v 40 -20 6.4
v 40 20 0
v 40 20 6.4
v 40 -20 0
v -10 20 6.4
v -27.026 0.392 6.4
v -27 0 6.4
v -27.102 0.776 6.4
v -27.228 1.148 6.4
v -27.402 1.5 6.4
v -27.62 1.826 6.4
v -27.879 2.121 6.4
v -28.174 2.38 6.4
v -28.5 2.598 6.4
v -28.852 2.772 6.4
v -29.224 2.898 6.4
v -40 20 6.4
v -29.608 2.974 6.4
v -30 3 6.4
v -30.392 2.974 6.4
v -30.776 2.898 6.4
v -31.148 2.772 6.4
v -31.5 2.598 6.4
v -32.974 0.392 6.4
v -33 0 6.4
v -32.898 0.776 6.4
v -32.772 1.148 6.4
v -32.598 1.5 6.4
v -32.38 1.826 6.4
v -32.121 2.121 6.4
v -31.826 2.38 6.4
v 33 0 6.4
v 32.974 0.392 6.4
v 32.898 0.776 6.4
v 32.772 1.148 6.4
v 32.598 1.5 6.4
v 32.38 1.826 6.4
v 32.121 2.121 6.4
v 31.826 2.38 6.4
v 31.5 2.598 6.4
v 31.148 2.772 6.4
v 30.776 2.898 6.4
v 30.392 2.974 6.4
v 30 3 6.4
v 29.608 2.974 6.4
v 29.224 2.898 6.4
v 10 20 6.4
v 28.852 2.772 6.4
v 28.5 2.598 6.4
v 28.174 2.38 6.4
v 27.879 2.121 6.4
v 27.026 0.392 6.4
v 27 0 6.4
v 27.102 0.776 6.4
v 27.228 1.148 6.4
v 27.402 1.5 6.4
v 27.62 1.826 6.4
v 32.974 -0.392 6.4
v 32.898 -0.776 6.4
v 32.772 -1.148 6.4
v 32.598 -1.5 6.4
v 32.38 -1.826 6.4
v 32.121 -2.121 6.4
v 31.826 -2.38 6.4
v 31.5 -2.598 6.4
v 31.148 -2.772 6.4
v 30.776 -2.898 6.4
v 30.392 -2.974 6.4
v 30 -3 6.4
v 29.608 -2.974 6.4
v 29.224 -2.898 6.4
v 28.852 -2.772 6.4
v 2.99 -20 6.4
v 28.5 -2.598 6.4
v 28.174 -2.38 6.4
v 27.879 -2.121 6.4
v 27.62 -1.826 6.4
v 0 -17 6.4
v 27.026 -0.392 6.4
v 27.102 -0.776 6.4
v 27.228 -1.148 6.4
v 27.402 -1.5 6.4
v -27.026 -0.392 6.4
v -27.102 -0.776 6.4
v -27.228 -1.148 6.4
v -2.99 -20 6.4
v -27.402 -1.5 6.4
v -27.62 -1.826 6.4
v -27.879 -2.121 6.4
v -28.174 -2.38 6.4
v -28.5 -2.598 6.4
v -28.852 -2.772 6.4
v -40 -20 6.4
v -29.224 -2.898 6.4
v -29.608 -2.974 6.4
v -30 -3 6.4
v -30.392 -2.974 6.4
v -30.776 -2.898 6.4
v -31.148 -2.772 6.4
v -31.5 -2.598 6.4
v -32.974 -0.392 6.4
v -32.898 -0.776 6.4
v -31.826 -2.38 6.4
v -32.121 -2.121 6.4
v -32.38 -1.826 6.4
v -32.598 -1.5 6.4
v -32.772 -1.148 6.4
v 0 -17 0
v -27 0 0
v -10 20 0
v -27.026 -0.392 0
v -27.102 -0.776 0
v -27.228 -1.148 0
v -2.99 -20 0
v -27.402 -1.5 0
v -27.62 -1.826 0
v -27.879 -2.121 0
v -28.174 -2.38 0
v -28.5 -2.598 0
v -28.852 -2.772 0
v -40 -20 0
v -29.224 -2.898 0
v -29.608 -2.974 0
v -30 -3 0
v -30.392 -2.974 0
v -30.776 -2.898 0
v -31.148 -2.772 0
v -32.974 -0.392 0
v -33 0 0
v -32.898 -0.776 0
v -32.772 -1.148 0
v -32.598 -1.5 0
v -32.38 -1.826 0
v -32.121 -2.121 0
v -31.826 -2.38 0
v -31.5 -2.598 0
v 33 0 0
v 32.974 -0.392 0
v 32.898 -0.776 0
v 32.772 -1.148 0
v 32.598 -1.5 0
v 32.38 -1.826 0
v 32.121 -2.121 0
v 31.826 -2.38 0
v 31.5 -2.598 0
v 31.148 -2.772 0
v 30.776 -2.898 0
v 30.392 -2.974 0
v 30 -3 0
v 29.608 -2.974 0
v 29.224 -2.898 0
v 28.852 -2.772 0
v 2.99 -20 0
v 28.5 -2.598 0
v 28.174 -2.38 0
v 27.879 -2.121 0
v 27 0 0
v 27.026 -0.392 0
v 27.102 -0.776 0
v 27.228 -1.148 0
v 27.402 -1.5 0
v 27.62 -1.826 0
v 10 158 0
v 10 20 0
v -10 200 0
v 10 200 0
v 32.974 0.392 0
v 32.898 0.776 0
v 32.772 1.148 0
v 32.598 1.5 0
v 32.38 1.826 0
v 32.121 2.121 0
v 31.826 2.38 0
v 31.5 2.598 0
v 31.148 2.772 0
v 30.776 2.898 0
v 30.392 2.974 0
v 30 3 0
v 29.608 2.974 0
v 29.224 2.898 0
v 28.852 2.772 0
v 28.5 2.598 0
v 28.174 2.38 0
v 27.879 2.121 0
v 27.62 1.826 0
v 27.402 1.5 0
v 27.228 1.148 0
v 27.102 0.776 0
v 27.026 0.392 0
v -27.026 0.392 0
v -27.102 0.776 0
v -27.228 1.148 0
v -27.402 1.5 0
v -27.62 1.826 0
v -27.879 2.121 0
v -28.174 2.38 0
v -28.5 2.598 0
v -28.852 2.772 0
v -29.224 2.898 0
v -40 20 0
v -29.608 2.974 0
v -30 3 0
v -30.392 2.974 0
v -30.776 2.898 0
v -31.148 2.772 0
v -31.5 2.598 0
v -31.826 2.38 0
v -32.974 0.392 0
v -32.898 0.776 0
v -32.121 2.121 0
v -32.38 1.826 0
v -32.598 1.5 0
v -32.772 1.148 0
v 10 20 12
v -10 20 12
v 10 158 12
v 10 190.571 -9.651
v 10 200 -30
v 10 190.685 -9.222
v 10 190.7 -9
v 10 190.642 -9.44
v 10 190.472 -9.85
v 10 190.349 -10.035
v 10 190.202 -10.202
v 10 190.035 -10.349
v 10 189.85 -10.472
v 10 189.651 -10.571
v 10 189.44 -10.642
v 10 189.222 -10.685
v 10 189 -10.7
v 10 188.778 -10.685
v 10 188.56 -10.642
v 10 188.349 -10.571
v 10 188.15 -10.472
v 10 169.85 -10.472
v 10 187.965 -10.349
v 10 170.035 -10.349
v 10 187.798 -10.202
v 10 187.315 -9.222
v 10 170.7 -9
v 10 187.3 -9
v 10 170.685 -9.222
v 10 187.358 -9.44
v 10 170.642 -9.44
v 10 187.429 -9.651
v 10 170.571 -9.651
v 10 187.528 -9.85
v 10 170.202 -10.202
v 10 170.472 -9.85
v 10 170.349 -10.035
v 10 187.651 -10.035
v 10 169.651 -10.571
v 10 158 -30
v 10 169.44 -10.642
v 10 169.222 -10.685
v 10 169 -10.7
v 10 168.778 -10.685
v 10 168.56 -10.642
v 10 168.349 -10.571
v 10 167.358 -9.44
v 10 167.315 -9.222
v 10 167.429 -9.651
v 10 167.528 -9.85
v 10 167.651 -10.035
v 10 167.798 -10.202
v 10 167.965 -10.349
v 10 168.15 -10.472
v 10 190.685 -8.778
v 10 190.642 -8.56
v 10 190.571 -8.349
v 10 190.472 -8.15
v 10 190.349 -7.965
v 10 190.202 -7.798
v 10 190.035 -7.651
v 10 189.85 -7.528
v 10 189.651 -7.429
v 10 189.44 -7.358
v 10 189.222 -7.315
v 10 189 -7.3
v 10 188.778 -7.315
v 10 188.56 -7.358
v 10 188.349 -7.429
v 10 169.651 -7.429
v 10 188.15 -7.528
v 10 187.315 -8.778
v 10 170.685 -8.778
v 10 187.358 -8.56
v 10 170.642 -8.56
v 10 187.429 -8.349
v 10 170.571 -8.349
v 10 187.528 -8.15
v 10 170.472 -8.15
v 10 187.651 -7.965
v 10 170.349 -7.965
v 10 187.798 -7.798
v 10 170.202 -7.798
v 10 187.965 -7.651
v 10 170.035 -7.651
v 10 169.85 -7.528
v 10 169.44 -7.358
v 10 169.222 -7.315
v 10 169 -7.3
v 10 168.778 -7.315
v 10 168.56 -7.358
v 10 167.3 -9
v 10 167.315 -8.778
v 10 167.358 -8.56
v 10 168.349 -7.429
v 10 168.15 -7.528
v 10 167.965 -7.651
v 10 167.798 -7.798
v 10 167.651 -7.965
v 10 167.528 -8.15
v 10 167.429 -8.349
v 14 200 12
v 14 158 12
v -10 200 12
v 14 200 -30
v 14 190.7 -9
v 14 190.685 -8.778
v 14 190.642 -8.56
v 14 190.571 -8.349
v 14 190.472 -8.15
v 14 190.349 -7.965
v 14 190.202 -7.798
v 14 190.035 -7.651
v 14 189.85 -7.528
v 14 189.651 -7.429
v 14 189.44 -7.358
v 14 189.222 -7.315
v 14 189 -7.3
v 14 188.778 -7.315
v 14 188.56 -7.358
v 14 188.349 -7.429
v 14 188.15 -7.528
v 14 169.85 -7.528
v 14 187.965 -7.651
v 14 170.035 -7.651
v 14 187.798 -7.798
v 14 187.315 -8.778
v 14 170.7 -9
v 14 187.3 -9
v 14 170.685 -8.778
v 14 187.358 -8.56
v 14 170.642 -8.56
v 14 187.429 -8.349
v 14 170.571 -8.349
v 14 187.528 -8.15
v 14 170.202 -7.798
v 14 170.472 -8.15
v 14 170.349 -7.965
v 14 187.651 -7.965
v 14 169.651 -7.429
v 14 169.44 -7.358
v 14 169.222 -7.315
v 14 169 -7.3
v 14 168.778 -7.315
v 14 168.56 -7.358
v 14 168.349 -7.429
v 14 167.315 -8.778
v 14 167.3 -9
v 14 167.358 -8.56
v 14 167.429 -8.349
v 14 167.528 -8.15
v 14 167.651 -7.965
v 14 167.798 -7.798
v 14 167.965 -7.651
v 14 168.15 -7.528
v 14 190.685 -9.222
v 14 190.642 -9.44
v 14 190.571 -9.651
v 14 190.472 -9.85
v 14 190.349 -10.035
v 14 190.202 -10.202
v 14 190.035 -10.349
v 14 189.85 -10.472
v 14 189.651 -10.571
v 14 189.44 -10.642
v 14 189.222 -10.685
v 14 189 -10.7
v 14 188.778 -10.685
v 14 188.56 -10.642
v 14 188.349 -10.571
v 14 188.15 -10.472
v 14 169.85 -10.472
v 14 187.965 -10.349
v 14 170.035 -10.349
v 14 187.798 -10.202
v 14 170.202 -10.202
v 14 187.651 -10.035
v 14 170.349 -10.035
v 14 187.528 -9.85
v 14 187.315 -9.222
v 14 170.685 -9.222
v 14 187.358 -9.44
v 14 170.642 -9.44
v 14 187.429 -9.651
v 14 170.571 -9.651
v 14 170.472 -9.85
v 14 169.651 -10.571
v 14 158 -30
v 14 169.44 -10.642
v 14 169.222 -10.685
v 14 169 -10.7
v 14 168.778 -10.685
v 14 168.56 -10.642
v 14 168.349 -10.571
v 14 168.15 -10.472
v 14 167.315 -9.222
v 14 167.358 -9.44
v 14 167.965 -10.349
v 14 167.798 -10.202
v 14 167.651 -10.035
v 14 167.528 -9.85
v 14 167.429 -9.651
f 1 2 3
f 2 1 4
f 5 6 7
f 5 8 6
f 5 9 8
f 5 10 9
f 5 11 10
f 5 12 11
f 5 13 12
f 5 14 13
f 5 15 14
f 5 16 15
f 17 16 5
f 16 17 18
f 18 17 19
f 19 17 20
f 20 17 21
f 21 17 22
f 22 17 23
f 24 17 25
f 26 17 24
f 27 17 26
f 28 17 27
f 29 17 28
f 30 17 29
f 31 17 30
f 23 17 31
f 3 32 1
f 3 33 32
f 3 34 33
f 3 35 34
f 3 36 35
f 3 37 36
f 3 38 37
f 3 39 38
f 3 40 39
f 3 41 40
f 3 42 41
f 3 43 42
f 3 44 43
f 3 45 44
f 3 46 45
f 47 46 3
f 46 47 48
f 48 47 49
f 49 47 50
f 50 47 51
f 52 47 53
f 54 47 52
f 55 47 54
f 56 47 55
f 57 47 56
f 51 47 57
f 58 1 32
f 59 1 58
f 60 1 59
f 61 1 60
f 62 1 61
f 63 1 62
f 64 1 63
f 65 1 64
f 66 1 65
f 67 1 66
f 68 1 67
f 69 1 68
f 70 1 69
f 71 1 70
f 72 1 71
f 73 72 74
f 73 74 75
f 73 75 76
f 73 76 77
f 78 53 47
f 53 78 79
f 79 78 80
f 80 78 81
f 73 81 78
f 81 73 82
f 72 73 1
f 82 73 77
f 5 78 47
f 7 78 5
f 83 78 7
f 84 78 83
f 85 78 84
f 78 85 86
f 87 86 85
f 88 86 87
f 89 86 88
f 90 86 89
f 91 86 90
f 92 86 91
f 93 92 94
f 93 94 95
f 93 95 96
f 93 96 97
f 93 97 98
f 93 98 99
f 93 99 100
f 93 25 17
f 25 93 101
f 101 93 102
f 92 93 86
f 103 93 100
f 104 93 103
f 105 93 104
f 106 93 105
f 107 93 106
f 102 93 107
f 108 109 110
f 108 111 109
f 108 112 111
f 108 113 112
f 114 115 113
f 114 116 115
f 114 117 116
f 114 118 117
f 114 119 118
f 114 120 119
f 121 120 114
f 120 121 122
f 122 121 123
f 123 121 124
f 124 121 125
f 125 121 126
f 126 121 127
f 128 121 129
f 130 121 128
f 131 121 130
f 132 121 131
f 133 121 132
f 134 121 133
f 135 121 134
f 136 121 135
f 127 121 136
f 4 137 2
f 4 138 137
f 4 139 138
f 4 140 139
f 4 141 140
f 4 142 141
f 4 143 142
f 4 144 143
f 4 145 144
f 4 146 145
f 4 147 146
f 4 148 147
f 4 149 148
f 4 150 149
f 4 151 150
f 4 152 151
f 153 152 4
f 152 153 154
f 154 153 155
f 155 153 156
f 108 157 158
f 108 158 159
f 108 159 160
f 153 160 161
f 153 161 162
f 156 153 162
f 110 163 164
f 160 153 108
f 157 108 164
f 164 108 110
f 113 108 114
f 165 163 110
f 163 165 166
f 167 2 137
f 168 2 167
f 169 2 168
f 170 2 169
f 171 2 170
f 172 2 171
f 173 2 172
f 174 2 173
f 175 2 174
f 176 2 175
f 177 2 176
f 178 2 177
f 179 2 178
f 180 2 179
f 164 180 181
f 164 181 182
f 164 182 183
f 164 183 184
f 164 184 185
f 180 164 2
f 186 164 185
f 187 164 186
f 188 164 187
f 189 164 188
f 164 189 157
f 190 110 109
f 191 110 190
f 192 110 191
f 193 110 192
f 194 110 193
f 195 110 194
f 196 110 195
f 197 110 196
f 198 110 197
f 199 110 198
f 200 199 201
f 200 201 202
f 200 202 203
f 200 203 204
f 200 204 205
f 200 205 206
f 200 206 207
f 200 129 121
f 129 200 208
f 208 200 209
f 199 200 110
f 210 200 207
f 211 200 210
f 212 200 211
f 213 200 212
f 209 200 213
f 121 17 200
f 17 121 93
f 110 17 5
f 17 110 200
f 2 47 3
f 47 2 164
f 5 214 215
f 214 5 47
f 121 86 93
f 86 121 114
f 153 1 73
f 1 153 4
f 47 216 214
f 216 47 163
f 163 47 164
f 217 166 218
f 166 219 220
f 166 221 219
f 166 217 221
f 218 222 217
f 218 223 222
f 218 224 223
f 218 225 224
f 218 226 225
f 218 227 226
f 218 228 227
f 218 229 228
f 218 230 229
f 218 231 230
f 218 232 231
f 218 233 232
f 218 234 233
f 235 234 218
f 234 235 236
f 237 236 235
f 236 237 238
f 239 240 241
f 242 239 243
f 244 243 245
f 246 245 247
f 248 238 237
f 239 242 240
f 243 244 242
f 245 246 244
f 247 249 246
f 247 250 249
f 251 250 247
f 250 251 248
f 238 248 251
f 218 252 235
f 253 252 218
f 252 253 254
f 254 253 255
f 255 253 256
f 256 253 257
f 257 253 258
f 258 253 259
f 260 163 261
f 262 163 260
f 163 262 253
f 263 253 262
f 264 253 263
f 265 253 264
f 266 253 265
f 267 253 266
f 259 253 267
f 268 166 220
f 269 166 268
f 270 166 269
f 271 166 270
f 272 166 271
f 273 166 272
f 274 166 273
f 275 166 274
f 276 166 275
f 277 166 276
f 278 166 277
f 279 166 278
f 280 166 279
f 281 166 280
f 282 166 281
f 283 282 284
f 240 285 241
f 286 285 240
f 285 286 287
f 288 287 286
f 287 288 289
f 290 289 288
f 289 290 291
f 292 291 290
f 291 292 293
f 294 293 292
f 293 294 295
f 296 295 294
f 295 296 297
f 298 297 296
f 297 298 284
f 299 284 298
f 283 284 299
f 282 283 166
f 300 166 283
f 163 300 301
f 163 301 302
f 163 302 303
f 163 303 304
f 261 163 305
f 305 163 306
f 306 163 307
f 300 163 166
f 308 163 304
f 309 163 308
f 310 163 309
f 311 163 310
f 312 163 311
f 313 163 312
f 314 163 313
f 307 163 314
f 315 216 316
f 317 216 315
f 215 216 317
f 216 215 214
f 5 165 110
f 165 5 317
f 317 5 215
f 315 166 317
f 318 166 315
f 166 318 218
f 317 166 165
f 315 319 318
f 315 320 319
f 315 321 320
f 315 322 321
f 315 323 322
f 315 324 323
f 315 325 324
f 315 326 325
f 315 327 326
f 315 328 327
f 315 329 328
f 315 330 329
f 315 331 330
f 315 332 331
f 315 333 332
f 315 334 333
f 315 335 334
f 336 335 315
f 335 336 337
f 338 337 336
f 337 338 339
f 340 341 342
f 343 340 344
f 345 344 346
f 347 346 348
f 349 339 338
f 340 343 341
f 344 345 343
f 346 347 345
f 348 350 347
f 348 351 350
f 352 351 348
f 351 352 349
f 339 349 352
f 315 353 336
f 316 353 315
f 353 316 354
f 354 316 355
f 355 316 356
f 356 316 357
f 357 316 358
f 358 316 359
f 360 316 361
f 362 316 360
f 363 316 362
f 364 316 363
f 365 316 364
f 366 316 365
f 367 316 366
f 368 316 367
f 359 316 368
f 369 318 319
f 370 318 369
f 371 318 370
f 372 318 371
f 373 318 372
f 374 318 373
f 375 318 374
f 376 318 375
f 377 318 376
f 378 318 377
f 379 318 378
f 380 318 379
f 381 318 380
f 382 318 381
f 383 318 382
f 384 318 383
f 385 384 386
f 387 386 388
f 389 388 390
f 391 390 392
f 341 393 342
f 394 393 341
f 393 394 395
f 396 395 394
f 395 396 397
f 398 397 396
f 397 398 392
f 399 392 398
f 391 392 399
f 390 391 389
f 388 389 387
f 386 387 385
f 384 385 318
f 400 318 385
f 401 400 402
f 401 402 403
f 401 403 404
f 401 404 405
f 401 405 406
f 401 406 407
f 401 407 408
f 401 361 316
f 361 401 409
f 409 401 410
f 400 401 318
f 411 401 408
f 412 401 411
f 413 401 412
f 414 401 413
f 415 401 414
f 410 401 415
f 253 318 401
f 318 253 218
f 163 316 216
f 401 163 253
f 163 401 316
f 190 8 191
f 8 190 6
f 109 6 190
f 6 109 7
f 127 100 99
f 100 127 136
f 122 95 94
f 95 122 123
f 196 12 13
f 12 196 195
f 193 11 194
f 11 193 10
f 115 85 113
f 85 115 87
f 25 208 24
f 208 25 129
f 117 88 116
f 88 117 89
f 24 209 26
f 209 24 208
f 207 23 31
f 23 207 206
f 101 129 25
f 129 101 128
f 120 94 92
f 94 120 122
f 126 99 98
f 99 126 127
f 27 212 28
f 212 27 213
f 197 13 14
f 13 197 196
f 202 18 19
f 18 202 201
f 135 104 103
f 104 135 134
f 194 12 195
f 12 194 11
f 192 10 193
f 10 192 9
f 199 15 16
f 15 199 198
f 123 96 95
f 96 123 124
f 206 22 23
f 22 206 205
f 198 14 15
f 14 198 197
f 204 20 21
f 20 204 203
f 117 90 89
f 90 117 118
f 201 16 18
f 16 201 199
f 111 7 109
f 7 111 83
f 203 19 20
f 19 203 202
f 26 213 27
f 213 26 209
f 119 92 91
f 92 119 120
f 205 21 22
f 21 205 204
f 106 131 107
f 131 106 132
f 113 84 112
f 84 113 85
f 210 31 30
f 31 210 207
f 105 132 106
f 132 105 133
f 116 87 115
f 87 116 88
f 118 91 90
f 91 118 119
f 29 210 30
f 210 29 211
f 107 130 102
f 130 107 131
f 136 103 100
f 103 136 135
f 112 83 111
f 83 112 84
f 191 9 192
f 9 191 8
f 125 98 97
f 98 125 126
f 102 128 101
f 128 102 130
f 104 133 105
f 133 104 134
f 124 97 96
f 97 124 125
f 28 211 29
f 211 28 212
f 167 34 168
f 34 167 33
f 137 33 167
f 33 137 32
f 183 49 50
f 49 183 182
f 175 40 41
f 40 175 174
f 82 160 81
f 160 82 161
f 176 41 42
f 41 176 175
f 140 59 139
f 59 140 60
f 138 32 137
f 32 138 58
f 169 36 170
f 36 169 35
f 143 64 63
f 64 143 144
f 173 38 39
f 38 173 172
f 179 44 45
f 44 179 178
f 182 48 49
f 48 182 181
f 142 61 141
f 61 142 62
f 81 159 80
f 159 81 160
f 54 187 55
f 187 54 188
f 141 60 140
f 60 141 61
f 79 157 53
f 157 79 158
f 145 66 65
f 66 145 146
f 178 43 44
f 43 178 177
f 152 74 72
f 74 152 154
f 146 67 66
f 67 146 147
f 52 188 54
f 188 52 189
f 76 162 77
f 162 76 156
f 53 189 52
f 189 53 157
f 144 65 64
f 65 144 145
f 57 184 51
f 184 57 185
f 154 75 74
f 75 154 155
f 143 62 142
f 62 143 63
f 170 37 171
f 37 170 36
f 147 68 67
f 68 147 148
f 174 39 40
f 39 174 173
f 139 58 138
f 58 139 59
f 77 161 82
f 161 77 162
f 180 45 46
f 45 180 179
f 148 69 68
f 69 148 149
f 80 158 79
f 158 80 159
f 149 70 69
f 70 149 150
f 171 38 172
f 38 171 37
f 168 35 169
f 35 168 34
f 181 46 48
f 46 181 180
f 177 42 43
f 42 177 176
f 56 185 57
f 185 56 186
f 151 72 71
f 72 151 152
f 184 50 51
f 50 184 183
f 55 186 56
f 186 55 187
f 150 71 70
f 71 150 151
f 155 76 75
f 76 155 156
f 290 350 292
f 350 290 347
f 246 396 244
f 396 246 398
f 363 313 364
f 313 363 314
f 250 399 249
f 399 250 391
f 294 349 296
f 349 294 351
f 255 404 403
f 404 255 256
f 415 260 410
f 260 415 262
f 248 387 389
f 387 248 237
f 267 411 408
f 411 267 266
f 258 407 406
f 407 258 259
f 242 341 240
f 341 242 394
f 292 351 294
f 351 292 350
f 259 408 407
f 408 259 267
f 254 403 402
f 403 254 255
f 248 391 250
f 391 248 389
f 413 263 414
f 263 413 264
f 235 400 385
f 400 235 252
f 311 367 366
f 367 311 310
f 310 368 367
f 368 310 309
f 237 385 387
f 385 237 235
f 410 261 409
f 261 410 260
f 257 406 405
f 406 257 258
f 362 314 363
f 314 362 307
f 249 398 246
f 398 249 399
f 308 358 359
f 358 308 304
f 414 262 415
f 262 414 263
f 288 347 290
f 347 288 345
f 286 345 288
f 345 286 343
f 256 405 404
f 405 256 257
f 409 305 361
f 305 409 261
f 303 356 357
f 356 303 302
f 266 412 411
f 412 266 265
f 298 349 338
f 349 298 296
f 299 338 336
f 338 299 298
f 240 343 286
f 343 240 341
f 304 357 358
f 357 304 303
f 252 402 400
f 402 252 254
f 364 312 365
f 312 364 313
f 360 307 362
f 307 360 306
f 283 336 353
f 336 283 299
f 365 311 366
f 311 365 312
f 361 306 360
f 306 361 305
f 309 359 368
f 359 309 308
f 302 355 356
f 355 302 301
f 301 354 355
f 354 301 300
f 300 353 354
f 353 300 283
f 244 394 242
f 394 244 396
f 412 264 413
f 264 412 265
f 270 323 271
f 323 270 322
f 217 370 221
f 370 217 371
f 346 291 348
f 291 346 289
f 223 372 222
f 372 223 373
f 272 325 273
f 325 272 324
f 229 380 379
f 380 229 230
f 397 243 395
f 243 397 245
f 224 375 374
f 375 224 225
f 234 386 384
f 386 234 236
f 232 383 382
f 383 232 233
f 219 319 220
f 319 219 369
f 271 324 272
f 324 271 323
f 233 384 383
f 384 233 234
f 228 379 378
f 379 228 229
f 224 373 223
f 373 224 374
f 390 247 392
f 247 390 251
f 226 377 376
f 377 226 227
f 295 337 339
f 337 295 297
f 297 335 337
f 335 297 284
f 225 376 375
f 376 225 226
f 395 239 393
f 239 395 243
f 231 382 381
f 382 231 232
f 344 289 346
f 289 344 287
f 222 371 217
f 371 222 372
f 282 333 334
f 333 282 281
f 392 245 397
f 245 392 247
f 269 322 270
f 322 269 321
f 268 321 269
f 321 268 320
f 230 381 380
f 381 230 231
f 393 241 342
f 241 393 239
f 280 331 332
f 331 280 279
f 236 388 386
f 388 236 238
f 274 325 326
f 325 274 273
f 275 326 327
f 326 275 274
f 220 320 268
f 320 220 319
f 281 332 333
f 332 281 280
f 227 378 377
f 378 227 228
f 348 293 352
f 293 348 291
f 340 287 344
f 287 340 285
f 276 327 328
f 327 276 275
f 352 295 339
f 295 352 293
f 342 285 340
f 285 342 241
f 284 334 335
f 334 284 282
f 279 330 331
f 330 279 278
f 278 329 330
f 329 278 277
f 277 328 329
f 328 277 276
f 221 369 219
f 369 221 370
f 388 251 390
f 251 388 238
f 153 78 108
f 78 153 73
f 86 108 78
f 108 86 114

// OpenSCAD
// Camera bracket for a 40 mm T-slot bar. Units: mm. Print in PETG, solid (100 % infill), foot down, supports under the arm and the side plate.
// Origin: the middle of the foot's underside. x along the foot's long side, y along the arm, z up.
foot = [80, 40, 6.4];
hole_d = 6;        // a light push fit on an M6 screw: ream after printing if it binds
hole_dx = 30;     // each hole from the foot's middle
notch = 3;          // V notch in the long edge away from the arm
arm = [20, 12];       // width, height
arm_end = 200;      // the arm's end from the foot's middle
plate = [4, 42, 42];  // side plate for the camera's back: thickness, width, height
cam_drop = 30;    // the plate hangs this far below the arm's underside
m3 = 3.4;                          // two holes 20 mm apart for the camera's M3 back threads
$fn = 48;

difference() {
    union() {
        translate([-foot[0] / 2, -foot[1] / 2, 0]) cube(foot);
        translate([-arm[0] / 2, foot[1] / 2, 0]) cube([arm[0], arm_end - foot[1] / 2, arm[1]]);
        translate([arm[0] / 2, arm_end - plate[1], arm[1] - plate[2]]) cube(plate);
    }
    for (sx = [-1, 1]) translate([sx * hole_dx, 0, -1]) cylinder(d = hole_d, h = foot[2] + 2);
    translate([0, -foot[1] / 2, -1]) linear_extrude(foot[2] + 2) polygon([[-notch, -0.01], [notch, -0.01], [0, notch]]);
    for (sy = [-10, 10]) translate([arm[0] / 2 - 1, arm_end - plate[1] / 2 + sy, arm[1] - plate[2] / 2]) rotate([0, 90, 0]) cylinder(d = m3, h = plate[0] + 2);
}
